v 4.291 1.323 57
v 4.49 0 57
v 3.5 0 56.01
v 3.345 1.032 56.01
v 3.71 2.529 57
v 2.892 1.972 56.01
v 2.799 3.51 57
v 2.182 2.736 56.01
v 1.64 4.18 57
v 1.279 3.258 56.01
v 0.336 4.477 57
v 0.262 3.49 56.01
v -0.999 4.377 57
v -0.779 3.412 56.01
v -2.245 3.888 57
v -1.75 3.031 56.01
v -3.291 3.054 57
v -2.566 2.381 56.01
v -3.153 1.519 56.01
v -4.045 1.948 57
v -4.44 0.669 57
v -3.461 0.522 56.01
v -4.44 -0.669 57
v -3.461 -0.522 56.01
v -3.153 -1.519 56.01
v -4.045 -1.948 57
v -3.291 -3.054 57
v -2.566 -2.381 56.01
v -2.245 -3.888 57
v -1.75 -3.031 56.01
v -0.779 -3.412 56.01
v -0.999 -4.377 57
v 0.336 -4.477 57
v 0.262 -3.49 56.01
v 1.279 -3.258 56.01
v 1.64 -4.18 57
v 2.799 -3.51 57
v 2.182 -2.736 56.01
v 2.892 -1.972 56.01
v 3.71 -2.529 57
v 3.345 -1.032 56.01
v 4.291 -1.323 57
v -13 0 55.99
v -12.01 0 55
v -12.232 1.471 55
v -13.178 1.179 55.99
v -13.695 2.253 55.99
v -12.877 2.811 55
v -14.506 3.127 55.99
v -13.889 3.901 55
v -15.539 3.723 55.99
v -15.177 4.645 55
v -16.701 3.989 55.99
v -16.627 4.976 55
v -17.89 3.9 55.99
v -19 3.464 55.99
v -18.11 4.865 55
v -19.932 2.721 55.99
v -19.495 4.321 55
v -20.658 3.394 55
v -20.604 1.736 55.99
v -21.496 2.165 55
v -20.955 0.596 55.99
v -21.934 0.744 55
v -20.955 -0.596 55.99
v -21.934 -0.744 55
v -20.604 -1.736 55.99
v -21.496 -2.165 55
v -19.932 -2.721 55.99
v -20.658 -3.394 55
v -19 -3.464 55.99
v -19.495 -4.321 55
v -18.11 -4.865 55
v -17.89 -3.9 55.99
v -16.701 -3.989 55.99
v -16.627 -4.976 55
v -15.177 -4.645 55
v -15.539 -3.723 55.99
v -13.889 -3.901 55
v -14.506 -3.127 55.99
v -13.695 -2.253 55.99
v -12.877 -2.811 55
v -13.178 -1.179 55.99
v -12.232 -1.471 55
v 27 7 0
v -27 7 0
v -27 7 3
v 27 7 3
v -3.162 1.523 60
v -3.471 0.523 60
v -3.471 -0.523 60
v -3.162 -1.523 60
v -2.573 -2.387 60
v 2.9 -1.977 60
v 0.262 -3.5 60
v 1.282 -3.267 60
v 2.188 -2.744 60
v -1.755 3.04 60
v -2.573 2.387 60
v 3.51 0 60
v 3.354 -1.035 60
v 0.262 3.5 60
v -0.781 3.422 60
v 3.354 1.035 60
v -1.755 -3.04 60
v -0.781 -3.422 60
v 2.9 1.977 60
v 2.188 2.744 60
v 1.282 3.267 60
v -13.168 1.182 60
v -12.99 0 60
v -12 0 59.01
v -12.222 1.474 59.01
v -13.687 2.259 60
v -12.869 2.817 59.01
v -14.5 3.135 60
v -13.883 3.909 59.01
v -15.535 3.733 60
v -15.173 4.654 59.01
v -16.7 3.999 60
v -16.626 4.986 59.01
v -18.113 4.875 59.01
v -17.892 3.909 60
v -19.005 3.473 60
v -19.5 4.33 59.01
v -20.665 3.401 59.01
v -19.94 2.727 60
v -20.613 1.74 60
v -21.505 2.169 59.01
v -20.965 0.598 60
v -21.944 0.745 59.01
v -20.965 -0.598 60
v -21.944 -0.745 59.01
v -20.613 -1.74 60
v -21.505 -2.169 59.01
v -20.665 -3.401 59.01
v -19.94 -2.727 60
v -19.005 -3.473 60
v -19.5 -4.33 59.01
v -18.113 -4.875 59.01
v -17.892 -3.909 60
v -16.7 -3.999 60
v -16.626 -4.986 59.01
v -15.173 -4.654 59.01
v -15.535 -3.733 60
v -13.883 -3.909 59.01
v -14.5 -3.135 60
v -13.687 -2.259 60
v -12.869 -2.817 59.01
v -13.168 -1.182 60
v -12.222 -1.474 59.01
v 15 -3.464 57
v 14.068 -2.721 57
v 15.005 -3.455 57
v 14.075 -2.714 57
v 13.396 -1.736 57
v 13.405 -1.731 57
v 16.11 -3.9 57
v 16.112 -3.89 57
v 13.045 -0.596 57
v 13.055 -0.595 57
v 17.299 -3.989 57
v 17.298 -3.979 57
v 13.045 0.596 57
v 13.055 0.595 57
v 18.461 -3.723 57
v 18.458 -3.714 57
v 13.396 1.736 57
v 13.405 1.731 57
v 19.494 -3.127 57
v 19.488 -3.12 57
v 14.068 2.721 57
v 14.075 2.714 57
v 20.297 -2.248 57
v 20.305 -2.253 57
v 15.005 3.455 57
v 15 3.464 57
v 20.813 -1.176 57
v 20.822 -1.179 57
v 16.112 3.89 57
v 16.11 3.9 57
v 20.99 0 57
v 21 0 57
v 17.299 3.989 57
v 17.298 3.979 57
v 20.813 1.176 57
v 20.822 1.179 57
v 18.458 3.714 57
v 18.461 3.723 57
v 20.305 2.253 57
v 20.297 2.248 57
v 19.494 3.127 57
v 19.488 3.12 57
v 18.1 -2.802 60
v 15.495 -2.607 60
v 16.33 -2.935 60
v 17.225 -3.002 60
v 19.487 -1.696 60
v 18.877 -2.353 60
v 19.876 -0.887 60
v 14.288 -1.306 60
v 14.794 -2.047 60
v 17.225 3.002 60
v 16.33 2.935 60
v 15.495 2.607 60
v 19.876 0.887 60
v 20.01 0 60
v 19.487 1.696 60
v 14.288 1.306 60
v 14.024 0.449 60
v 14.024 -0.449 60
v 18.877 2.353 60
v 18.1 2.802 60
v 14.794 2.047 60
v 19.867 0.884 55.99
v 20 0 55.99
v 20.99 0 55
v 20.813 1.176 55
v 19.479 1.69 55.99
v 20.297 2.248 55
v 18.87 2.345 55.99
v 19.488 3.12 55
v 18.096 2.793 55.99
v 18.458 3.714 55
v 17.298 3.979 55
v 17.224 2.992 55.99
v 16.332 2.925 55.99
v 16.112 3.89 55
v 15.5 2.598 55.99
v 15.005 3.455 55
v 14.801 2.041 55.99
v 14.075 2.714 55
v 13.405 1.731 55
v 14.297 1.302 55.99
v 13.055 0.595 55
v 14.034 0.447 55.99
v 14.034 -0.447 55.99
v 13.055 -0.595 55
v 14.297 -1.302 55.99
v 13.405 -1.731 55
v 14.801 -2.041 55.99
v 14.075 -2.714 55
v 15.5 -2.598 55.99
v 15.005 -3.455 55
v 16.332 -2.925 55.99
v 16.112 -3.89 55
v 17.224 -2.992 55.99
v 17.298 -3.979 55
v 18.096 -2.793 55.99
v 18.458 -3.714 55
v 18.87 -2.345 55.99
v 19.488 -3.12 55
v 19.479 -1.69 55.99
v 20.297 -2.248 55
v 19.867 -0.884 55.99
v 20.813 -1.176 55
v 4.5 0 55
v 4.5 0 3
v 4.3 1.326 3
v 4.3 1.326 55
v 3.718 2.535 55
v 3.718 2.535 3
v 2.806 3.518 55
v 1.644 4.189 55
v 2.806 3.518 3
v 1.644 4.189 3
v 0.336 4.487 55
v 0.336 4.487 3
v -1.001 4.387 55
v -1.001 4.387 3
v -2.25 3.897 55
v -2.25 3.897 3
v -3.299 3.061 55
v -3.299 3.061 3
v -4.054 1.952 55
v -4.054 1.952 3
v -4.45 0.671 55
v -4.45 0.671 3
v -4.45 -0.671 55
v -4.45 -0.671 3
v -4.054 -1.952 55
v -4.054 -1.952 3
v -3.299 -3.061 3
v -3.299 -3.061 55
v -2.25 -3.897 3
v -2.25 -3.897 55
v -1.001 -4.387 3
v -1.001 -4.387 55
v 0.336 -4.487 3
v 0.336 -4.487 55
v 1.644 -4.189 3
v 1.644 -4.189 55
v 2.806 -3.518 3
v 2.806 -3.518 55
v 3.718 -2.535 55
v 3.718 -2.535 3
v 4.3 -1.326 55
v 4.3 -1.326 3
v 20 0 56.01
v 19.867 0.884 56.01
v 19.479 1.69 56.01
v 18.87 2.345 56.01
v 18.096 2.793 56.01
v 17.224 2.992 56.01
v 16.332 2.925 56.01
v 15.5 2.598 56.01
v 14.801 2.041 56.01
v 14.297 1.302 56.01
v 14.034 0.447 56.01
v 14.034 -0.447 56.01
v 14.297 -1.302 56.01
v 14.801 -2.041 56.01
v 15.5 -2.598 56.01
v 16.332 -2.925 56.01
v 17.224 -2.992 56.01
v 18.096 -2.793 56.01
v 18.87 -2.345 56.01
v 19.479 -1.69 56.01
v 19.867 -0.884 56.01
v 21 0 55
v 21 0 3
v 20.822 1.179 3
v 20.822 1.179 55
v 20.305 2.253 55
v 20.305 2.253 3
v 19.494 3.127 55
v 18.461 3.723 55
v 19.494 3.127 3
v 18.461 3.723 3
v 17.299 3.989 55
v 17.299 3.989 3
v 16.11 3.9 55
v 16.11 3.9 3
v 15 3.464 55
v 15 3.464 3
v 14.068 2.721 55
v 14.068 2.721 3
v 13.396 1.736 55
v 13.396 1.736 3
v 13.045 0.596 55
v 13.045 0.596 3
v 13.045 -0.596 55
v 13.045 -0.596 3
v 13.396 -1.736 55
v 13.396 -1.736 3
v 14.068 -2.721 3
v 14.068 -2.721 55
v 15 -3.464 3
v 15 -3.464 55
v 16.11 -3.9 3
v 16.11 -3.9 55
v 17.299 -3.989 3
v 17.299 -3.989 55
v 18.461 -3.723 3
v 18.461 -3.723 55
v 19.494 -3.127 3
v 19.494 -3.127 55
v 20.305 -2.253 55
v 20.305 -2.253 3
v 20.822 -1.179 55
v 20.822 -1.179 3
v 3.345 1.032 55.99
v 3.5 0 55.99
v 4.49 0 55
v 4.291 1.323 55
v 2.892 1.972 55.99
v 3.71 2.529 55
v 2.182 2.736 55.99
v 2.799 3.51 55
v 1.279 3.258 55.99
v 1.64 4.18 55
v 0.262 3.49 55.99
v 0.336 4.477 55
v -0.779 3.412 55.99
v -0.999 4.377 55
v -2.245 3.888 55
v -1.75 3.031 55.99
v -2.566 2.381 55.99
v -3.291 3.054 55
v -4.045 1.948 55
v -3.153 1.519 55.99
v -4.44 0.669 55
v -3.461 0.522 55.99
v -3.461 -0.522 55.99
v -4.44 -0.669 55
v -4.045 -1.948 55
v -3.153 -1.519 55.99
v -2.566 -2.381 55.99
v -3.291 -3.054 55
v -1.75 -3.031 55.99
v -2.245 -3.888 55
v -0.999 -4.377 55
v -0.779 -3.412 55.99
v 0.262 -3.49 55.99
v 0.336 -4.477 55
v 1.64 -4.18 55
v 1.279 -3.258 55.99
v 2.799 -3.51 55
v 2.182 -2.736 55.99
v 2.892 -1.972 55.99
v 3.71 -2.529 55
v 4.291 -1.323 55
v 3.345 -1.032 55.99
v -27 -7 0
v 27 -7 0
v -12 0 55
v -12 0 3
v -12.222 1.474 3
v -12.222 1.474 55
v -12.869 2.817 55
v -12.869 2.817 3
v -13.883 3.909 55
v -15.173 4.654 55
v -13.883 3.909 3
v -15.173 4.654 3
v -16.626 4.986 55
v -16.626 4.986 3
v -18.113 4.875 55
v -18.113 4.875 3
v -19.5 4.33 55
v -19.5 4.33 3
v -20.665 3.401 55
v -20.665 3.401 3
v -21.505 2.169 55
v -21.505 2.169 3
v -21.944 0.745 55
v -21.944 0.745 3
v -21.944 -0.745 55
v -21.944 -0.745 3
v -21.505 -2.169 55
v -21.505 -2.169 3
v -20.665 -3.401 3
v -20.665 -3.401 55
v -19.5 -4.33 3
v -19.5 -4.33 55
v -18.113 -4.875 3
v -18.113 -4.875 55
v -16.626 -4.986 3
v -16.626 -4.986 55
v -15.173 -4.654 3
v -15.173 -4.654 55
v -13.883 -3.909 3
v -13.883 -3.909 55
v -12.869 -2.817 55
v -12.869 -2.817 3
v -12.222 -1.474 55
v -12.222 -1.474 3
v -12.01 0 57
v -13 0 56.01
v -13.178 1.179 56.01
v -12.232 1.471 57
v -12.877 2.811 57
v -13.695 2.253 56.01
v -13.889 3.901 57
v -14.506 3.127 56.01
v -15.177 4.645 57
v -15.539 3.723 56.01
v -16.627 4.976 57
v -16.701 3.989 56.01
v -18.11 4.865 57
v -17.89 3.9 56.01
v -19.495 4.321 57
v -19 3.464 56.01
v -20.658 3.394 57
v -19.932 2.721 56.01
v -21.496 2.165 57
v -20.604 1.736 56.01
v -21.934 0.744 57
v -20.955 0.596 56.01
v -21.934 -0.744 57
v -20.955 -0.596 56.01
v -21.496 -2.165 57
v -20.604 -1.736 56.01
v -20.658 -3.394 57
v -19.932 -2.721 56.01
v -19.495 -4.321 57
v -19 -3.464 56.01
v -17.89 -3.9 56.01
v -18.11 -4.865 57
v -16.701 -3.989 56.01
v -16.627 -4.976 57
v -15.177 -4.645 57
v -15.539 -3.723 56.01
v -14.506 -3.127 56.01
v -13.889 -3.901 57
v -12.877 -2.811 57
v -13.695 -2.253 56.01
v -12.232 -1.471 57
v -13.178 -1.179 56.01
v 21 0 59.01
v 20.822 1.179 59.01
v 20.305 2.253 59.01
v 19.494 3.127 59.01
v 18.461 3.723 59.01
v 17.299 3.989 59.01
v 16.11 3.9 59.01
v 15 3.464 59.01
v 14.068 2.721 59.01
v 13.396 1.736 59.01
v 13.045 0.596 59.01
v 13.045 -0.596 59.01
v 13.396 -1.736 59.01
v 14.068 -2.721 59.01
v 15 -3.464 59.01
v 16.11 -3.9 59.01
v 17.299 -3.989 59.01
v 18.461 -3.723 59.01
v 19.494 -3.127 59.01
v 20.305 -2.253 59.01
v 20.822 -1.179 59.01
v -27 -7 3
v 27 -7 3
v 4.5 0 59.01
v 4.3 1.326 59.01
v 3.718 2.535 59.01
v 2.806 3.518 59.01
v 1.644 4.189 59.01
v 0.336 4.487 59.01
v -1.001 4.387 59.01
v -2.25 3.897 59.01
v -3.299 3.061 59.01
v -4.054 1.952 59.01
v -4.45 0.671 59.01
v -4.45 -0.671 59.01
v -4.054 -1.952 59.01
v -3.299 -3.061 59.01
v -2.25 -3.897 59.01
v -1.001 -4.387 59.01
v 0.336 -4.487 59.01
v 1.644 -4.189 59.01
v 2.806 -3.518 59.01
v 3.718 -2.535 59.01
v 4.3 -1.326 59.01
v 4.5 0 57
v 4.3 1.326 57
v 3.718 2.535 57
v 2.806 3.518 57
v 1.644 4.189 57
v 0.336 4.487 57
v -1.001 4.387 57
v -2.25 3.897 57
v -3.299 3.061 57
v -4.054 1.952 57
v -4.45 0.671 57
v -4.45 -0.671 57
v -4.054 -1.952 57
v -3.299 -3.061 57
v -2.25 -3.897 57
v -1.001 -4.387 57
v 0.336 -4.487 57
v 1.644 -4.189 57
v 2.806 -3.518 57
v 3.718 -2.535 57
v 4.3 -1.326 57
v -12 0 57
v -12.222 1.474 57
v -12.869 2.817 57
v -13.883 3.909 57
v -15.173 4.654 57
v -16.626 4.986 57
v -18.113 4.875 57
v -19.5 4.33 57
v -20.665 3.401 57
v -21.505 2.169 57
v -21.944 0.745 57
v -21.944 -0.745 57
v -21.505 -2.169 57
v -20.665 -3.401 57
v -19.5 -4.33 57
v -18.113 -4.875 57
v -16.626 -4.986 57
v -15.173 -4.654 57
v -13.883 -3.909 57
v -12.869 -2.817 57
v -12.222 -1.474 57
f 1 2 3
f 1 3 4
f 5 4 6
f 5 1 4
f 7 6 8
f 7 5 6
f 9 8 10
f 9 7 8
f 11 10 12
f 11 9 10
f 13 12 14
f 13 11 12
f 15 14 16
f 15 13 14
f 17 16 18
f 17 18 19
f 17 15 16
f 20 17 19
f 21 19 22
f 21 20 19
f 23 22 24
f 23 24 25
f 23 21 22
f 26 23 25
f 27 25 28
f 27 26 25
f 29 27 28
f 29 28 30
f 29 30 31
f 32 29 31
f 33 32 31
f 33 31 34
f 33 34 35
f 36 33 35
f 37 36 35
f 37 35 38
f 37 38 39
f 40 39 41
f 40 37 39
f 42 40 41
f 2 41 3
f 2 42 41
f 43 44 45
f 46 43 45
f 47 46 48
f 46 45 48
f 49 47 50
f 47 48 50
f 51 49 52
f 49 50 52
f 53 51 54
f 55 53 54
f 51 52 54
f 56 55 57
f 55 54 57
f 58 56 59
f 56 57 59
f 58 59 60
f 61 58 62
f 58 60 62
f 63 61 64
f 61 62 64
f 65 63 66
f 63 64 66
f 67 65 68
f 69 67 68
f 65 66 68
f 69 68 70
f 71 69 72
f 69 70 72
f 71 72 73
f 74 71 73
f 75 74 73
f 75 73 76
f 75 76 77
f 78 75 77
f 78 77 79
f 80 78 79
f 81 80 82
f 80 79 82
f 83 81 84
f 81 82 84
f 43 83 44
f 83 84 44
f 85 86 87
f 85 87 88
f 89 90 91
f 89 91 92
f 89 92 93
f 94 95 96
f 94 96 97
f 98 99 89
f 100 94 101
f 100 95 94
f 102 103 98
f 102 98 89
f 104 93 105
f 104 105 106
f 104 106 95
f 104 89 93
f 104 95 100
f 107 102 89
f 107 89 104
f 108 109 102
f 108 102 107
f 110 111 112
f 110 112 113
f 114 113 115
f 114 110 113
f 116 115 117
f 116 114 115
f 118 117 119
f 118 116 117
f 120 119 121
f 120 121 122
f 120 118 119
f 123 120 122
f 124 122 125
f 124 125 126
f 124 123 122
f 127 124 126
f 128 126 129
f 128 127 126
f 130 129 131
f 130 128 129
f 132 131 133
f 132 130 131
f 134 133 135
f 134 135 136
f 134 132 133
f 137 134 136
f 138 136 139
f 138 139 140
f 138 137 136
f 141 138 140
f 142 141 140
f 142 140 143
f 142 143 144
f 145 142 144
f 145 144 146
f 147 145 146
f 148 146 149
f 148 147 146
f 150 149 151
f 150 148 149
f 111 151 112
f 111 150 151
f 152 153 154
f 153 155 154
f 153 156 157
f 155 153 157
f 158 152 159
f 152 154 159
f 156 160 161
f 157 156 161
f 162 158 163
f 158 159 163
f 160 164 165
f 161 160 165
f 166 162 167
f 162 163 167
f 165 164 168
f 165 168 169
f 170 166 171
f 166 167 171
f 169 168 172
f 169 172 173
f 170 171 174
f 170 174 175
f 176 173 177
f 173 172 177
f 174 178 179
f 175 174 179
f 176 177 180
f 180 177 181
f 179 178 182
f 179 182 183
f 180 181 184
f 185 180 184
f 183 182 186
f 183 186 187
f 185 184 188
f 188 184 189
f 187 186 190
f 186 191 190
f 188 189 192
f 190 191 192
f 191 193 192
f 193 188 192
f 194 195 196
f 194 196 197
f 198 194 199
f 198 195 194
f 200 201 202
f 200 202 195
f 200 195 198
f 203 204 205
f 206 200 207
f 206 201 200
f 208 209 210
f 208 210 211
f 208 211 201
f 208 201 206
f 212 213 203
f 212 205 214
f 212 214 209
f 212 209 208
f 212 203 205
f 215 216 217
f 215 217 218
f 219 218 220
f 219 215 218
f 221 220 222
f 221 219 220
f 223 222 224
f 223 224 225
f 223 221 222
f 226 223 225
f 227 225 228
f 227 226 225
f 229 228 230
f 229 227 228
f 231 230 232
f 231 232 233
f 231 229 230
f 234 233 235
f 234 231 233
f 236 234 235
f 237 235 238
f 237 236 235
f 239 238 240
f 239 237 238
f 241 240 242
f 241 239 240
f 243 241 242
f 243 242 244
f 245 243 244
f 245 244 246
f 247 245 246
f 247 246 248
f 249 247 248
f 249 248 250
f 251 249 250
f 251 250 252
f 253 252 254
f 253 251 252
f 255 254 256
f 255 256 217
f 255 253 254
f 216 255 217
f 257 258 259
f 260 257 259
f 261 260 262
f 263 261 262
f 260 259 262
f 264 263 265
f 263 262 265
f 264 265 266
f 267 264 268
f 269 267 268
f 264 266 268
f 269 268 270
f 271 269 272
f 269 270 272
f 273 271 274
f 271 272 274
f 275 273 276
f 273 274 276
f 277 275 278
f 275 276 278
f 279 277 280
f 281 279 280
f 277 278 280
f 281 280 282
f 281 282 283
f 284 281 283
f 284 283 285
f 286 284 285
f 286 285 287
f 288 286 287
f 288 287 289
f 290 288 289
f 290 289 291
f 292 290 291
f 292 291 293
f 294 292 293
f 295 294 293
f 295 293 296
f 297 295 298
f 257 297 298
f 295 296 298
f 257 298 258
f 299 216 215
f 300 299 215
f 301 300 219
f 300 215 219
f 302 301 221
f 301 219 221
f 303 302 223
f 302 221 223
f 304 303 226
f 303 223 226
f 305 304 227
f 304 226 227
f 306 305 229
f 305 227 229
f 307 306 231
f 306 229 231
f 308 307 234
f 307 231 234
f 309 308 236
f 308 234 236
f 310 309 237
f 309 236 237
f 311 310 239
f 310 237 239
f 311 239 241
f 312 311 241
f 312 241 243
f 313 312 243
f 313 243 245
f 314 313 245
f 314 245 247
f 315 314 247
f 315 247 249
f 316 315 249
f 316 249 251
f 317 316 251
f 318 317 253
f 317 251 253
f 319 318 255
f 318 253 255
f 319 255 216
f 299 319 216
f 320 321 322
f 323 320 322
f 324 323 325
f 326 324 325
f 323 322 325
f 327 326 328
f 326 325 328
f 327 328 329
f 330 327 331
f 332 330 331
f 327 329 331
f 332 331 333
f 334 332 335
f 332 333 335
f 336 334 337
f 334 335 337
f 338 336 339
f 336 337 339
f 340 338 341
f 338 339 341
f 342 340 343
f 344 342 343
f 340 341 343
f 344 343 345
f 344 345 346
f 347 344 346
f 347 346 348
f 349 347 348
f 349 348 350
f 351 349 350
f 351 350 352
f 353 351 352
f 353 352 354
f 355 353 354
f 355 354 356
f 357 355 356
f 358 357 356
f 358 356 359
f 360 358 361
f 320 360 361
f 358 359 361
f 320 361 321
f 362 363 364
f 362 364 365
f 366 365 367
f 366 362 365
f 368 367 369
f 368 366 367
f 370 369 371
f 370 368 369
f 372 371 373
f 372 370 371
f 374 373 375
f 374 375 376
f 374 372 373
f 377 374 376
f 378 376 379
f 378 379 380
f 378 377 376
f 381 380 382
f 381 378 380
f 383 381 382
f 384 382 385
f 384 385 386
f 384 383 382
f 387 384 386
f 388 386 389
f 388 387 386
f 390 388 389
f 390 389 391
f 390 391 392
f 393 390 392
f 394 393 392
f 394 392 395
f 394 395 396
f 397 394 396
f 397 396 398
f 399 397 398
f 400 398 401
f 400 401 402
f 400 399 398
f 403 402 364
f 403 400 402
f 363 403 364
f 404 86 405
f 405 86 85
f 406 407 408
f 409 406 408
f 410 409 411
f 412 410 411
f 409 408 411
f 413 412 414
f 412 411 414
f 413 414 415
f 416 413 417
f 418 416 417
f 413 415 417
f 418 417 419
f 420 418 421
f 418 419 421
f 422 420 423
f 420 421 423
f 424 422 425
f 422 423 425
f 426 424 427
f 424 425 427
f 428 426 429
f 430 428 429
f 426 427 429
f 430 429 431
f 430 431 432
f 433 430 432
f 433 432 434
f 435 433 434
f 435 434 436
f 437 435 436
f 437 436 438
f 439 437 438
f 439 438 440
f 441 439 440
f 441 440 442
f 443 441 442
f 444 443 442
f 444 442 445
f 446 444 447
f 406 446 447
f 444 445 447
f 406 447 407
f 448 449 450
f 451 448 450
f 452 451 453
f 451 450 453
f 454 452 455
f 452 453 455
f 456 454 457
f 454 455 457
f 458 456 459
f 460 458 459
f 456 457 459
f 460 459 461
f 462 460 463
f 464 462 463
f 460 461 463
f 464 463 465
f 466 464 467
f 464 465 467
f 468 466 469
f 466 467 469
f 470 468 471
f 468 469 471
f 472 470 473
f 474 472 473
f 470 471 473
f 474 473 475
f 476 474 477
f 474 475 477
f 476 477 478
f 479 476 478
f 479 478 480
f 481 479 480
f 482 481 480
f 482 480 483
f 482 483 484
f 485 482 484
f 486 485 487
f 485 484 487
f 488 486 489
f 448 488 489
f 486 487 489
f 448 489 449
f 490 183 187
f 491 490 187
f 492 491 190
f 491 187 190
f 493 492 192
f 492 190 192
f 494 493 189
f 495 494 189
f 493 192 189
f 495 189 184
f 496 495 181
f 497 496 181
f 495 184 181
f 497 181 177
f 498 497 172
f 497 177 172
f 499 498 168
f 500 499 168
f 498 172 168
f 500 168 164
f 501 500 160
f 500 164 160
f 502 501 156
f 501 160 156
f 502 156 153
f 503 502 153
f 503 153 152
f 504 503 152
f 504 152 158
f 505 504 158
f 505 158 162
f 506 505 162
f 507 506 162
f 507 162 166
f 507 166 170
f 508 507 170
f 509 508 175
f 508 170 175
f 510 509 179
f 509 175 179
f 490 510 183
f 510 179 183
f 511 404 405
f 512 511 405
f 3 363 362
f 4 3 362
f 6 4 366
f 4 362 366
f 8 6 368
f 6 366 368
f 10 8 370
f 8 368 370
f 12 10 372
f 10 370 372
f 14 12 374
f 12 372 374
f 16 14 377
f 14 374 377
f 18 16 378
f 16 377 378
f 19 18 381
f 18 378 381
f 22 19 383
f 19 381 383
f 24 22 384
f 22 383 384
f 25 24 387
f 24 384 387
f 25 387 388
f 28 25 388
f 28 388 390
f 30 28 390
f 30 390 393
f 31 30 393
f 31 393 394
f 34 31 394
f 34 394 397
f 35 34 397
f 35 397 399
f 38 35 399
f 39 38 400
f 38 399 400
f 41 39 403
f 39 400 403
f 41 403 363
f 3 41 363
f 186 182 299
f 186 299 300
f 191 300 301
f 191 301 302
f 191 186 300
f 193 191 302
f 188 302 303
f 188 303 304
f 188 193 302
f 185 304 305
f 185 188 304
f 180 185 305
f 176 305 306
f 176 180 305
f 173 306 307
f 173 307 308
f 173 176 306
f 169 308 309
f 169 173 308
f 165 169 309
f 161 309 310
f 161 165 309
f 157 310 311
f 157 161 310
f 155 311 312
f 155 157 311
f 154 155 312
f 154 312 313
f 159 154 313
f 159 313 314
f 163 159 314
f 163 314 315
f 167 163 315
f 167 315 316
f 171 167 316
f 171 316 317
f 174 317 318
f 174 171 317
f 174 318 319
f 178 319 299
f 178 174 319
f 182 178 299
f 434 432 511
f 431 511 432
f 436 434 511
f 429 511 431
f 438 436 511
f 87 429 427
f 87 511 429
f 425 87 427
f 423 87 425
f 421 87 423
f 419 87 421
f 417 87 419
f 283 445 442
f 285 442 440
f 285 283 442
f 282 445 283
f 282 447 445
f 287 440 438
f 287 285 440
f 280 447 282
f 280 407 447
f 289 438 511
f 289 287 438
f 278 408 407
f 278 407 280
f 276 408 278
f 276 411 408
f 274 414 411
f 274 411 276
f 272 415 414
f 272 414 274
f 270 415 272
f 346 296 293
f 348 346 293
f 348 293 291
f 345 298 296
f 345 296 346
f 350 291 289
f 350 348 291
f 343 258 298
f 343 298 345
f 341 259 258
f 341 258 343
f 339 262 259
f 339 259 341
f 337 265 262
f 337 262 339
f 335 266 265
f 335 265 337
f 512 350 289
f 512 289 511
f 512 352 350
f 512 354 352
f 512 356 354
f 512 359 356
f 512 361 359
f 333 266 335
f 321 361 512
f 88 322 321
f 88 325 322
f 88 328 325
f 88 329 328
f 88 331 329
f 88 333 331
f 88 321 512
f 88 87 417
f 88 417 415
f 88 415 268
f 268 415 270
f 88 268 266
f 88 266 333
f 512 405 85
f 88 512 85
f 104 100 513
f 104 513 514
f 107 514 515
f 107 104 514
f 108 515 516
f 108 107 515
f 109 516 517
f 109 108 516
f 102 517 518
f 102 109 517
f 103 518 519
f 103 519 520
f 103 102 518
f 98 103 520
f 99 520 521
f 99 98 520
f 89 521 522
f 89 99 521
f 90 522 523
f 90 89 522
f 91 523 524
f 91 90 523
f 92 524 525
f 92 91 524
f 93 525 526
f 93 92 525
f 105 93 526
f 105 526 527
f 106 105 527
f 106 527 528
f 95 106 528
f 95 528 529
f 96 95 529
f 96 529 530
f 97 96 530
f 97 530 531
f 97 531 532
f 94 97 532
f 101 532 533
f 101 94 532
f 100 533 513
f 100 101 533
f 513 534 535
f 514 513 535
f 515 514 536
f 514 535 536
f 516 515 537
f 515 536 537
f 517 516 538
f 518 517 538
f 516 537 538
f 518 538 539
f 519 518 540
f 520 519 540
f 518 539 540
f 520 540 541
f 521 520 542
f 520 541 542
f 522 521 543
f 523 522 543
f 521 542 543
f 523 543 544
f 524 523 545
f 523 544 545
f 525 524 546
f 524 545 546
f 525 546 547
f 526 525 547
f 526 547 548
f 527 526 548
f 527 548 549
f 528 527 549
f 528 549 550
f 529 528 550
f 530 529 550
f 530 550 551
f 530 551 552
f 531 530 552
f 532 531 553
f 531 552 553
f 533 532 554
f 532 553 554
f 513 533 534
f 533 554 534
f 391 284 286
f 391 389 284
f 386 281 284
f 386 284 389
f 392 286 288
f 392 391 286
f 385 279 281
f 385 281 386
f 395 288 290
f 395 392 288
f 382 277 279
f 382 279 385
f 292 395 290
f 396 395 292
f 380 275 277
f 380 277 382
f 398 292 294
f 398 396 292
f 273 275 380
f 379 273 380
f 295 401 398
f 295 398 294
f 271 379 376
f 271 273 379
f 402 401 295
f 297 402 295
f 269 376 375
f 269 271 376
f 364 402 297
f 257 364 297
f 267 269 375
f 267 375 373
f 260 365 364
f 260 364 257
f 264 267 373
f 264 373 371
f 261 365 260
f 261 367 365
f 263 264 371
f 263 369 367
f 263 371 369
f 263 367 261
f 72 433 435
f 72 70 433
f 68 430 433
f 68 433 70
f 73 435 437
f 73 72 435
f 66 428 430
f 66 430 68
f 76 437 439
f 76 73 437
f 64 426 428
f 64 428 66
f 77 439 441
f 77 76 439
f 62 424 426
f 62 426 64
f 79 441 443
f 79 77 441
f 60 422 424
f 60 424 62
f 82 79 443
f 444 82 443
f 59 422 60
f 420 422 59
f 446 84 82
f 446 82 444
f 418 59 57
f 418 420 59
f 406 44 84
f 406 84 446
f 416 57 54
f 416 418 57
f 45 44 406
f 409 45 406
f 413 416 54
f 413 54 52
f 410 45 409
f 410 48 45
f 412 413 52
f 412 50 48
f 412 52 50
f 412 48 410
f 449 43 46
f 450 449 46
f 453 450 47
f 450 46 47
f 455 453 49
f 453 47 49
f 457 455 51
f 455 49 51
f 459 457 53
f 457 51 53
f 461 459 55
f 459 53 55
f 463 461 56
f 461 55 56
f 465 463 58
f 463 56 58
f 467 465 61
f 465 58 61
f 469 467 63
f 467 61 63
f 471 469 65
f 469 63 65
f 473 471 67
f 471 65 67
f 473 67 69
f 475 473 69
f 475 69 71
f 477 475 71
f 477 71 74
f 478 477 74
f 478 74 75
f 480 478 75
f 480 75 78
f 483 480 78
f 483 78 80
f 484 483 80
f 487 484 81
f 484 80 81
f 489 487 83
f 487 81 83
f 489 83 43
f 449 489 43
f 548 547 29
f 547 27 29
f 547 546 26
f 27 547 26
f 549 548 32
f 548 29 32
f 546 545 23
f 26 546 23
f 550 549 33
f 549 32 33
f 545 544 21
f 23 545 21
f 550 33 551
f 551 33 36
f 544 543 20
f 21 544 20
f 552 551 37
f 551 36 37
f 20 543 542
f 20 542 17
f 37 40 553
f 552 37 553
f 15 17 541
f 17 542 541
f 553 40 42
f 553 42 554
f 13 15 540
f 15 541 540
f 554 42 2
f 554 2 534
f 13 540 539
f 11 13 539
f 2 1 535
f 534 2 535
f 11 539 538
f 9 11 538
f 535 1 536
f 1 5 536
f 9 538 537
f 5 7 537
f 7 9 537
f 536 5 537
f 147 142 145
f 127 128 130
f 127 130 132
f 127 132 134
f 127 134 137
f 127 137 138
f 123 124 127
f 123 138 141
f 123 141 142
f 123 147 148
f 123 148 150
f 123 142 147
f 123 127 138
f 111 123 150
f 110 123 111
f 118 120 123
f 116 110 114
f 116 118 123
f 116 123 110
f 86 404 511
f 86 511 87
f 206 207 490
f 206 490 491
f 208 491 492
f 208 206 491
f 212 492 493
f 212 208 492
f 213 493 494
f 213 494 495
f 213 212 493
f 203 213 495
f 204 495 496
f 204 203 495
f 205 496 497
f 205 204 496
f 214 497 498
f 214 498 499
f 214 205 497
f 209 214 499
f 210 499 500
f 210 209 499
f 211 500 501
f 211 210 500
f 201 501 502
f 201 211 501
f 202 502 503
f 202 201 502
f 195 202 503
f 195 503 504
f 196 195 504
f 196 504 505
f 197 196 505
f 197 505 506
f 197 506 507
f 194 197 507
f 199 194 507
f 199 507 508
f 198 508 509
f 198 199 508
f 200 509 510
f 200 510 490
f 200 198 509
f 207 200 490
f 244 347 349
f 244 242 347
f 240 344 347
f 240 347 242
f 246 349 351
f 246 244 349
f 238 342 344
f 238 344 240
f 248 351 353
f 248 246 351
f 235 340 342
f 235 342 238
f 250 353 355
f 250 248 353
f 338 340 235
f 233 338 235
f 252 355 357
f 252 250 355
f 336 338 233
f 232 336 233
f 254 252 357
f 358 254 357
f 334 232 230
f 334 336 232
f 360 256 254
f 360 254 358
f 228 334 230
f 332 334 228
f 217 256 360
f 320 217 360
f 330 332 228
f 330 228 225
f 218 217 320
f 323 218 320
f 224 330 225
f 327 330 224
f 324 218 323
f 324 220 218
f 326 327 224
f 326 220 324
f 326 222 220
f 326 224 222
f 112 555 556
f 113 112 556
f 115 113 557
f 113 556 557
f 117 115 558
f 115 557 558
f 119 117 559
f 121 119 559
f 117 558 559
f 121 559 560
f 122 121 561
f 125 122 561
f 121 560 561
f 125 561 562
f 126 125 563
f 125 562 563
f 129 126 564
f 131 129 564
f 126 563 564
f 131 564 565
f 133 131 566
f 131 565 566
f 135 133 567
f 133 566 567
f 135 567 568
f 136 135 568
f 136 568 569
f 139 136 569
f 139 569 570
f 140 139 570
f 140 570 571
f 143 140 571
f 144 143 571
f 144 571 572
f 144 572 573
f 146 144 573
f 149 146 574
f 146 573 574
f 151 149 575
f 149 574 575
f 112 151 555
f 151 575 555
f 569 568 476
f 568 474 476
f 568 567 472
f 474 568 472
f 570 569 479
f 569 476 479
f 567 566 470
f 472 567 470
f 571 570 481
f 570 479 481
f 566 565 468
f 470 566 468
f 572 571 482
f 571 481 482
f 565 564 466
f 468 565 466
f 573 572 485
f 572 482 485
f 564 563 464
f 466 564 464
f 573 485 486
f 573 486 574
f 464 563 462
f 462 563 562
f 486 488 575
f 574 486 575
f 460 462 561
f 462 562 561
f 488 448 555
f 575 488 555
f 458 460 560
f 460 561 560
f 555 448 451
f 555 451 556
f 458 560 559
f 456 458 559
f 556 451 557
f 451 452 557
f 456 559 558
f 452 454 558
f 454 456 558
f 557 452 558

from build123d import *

# Parameters (mm, degrees)
SKETCH_W      = 54
SKETCH_H      = 14
PAD_DEPTH     = 3
SKETCH001_R   = 4.5
SKETCH001_R_2 = 4
SKETCH001_R_3 = 5
PAD001_DEPTH  = 52
SKETCH002_R   = 4
SKETCH002_R_2 = 3.5
SKETCH002_R_3 = 3
PAD002_DEPTH  = 2
SKETCH003_R   = 5
SKETCH003_R_2 = 4.5
SKETCH003_R_3 = 4
PAD003_DEPTH  = 3
CHAMFER_SIZE  = 0.99


with BuildPart() as part:
    # Sketch → Pad (new body)
    with BuildSketch(Plane.XY):
        Rectangle(SKETCH_W, SKETCH_H)
    extrude(amount=PAD_DEPTH)

    # Sketch001 (on Face6 of Pad) → Pad001 (join)
    with BuildSketch(Plane.XY.offset(3)):
        Circle(SKETCH001_R)
        with Locations((17, 0)):
            Circle(SKETCH001_R_2)
        with Locations((-17, 0)):
            Circle(SKETCH001_R_3)
    extrude(amount=PAD001_DEPTH)

    # Sketch002 (on Face10 of Pad001) → Pad002 (join)
    with BuildSketch(Plane.XY.offset(55)):
        with Locations((-17, 0)):
            Circle(SKETCH002_R)
        Circle(SKETCH002_R_2)
        with Locations((17, 0)):
            Circle(SKETCH002_R_3)
    extrude(amount=PAD002_DEPTH)

    # Sketch003 (on Face16 of Pad002) → Pad003 (join)
    with BuildSketch(Plane.XY.offset(57)):
        with Locations((-17, 0)):
            Circle(SKETCH003_R)
        Circle(SKETCH003_R_2)
        with Locations((17, 0)):
            Circle(SKETCH003_R_3)
    extrude(amount=PAD003_DEPTH)

    # Chamfer
    chamfer_edges = [part.edges().sort_by_distance(p)[0] for p in [
        (-4.5, 0, 60),
        (13, 0, 60),
        (-22, 0, 60),
        (-21, 0, 57),
        (-3.5, 0, 57),
        (14, 0, 57),
        (-21, 0, 55),
        (-3.5, 0, 55),
        (14, 0, 55),
    ]]
    chamfer(chamfer_edges, length=CHAMFER_SIZE)


solid = part.part
